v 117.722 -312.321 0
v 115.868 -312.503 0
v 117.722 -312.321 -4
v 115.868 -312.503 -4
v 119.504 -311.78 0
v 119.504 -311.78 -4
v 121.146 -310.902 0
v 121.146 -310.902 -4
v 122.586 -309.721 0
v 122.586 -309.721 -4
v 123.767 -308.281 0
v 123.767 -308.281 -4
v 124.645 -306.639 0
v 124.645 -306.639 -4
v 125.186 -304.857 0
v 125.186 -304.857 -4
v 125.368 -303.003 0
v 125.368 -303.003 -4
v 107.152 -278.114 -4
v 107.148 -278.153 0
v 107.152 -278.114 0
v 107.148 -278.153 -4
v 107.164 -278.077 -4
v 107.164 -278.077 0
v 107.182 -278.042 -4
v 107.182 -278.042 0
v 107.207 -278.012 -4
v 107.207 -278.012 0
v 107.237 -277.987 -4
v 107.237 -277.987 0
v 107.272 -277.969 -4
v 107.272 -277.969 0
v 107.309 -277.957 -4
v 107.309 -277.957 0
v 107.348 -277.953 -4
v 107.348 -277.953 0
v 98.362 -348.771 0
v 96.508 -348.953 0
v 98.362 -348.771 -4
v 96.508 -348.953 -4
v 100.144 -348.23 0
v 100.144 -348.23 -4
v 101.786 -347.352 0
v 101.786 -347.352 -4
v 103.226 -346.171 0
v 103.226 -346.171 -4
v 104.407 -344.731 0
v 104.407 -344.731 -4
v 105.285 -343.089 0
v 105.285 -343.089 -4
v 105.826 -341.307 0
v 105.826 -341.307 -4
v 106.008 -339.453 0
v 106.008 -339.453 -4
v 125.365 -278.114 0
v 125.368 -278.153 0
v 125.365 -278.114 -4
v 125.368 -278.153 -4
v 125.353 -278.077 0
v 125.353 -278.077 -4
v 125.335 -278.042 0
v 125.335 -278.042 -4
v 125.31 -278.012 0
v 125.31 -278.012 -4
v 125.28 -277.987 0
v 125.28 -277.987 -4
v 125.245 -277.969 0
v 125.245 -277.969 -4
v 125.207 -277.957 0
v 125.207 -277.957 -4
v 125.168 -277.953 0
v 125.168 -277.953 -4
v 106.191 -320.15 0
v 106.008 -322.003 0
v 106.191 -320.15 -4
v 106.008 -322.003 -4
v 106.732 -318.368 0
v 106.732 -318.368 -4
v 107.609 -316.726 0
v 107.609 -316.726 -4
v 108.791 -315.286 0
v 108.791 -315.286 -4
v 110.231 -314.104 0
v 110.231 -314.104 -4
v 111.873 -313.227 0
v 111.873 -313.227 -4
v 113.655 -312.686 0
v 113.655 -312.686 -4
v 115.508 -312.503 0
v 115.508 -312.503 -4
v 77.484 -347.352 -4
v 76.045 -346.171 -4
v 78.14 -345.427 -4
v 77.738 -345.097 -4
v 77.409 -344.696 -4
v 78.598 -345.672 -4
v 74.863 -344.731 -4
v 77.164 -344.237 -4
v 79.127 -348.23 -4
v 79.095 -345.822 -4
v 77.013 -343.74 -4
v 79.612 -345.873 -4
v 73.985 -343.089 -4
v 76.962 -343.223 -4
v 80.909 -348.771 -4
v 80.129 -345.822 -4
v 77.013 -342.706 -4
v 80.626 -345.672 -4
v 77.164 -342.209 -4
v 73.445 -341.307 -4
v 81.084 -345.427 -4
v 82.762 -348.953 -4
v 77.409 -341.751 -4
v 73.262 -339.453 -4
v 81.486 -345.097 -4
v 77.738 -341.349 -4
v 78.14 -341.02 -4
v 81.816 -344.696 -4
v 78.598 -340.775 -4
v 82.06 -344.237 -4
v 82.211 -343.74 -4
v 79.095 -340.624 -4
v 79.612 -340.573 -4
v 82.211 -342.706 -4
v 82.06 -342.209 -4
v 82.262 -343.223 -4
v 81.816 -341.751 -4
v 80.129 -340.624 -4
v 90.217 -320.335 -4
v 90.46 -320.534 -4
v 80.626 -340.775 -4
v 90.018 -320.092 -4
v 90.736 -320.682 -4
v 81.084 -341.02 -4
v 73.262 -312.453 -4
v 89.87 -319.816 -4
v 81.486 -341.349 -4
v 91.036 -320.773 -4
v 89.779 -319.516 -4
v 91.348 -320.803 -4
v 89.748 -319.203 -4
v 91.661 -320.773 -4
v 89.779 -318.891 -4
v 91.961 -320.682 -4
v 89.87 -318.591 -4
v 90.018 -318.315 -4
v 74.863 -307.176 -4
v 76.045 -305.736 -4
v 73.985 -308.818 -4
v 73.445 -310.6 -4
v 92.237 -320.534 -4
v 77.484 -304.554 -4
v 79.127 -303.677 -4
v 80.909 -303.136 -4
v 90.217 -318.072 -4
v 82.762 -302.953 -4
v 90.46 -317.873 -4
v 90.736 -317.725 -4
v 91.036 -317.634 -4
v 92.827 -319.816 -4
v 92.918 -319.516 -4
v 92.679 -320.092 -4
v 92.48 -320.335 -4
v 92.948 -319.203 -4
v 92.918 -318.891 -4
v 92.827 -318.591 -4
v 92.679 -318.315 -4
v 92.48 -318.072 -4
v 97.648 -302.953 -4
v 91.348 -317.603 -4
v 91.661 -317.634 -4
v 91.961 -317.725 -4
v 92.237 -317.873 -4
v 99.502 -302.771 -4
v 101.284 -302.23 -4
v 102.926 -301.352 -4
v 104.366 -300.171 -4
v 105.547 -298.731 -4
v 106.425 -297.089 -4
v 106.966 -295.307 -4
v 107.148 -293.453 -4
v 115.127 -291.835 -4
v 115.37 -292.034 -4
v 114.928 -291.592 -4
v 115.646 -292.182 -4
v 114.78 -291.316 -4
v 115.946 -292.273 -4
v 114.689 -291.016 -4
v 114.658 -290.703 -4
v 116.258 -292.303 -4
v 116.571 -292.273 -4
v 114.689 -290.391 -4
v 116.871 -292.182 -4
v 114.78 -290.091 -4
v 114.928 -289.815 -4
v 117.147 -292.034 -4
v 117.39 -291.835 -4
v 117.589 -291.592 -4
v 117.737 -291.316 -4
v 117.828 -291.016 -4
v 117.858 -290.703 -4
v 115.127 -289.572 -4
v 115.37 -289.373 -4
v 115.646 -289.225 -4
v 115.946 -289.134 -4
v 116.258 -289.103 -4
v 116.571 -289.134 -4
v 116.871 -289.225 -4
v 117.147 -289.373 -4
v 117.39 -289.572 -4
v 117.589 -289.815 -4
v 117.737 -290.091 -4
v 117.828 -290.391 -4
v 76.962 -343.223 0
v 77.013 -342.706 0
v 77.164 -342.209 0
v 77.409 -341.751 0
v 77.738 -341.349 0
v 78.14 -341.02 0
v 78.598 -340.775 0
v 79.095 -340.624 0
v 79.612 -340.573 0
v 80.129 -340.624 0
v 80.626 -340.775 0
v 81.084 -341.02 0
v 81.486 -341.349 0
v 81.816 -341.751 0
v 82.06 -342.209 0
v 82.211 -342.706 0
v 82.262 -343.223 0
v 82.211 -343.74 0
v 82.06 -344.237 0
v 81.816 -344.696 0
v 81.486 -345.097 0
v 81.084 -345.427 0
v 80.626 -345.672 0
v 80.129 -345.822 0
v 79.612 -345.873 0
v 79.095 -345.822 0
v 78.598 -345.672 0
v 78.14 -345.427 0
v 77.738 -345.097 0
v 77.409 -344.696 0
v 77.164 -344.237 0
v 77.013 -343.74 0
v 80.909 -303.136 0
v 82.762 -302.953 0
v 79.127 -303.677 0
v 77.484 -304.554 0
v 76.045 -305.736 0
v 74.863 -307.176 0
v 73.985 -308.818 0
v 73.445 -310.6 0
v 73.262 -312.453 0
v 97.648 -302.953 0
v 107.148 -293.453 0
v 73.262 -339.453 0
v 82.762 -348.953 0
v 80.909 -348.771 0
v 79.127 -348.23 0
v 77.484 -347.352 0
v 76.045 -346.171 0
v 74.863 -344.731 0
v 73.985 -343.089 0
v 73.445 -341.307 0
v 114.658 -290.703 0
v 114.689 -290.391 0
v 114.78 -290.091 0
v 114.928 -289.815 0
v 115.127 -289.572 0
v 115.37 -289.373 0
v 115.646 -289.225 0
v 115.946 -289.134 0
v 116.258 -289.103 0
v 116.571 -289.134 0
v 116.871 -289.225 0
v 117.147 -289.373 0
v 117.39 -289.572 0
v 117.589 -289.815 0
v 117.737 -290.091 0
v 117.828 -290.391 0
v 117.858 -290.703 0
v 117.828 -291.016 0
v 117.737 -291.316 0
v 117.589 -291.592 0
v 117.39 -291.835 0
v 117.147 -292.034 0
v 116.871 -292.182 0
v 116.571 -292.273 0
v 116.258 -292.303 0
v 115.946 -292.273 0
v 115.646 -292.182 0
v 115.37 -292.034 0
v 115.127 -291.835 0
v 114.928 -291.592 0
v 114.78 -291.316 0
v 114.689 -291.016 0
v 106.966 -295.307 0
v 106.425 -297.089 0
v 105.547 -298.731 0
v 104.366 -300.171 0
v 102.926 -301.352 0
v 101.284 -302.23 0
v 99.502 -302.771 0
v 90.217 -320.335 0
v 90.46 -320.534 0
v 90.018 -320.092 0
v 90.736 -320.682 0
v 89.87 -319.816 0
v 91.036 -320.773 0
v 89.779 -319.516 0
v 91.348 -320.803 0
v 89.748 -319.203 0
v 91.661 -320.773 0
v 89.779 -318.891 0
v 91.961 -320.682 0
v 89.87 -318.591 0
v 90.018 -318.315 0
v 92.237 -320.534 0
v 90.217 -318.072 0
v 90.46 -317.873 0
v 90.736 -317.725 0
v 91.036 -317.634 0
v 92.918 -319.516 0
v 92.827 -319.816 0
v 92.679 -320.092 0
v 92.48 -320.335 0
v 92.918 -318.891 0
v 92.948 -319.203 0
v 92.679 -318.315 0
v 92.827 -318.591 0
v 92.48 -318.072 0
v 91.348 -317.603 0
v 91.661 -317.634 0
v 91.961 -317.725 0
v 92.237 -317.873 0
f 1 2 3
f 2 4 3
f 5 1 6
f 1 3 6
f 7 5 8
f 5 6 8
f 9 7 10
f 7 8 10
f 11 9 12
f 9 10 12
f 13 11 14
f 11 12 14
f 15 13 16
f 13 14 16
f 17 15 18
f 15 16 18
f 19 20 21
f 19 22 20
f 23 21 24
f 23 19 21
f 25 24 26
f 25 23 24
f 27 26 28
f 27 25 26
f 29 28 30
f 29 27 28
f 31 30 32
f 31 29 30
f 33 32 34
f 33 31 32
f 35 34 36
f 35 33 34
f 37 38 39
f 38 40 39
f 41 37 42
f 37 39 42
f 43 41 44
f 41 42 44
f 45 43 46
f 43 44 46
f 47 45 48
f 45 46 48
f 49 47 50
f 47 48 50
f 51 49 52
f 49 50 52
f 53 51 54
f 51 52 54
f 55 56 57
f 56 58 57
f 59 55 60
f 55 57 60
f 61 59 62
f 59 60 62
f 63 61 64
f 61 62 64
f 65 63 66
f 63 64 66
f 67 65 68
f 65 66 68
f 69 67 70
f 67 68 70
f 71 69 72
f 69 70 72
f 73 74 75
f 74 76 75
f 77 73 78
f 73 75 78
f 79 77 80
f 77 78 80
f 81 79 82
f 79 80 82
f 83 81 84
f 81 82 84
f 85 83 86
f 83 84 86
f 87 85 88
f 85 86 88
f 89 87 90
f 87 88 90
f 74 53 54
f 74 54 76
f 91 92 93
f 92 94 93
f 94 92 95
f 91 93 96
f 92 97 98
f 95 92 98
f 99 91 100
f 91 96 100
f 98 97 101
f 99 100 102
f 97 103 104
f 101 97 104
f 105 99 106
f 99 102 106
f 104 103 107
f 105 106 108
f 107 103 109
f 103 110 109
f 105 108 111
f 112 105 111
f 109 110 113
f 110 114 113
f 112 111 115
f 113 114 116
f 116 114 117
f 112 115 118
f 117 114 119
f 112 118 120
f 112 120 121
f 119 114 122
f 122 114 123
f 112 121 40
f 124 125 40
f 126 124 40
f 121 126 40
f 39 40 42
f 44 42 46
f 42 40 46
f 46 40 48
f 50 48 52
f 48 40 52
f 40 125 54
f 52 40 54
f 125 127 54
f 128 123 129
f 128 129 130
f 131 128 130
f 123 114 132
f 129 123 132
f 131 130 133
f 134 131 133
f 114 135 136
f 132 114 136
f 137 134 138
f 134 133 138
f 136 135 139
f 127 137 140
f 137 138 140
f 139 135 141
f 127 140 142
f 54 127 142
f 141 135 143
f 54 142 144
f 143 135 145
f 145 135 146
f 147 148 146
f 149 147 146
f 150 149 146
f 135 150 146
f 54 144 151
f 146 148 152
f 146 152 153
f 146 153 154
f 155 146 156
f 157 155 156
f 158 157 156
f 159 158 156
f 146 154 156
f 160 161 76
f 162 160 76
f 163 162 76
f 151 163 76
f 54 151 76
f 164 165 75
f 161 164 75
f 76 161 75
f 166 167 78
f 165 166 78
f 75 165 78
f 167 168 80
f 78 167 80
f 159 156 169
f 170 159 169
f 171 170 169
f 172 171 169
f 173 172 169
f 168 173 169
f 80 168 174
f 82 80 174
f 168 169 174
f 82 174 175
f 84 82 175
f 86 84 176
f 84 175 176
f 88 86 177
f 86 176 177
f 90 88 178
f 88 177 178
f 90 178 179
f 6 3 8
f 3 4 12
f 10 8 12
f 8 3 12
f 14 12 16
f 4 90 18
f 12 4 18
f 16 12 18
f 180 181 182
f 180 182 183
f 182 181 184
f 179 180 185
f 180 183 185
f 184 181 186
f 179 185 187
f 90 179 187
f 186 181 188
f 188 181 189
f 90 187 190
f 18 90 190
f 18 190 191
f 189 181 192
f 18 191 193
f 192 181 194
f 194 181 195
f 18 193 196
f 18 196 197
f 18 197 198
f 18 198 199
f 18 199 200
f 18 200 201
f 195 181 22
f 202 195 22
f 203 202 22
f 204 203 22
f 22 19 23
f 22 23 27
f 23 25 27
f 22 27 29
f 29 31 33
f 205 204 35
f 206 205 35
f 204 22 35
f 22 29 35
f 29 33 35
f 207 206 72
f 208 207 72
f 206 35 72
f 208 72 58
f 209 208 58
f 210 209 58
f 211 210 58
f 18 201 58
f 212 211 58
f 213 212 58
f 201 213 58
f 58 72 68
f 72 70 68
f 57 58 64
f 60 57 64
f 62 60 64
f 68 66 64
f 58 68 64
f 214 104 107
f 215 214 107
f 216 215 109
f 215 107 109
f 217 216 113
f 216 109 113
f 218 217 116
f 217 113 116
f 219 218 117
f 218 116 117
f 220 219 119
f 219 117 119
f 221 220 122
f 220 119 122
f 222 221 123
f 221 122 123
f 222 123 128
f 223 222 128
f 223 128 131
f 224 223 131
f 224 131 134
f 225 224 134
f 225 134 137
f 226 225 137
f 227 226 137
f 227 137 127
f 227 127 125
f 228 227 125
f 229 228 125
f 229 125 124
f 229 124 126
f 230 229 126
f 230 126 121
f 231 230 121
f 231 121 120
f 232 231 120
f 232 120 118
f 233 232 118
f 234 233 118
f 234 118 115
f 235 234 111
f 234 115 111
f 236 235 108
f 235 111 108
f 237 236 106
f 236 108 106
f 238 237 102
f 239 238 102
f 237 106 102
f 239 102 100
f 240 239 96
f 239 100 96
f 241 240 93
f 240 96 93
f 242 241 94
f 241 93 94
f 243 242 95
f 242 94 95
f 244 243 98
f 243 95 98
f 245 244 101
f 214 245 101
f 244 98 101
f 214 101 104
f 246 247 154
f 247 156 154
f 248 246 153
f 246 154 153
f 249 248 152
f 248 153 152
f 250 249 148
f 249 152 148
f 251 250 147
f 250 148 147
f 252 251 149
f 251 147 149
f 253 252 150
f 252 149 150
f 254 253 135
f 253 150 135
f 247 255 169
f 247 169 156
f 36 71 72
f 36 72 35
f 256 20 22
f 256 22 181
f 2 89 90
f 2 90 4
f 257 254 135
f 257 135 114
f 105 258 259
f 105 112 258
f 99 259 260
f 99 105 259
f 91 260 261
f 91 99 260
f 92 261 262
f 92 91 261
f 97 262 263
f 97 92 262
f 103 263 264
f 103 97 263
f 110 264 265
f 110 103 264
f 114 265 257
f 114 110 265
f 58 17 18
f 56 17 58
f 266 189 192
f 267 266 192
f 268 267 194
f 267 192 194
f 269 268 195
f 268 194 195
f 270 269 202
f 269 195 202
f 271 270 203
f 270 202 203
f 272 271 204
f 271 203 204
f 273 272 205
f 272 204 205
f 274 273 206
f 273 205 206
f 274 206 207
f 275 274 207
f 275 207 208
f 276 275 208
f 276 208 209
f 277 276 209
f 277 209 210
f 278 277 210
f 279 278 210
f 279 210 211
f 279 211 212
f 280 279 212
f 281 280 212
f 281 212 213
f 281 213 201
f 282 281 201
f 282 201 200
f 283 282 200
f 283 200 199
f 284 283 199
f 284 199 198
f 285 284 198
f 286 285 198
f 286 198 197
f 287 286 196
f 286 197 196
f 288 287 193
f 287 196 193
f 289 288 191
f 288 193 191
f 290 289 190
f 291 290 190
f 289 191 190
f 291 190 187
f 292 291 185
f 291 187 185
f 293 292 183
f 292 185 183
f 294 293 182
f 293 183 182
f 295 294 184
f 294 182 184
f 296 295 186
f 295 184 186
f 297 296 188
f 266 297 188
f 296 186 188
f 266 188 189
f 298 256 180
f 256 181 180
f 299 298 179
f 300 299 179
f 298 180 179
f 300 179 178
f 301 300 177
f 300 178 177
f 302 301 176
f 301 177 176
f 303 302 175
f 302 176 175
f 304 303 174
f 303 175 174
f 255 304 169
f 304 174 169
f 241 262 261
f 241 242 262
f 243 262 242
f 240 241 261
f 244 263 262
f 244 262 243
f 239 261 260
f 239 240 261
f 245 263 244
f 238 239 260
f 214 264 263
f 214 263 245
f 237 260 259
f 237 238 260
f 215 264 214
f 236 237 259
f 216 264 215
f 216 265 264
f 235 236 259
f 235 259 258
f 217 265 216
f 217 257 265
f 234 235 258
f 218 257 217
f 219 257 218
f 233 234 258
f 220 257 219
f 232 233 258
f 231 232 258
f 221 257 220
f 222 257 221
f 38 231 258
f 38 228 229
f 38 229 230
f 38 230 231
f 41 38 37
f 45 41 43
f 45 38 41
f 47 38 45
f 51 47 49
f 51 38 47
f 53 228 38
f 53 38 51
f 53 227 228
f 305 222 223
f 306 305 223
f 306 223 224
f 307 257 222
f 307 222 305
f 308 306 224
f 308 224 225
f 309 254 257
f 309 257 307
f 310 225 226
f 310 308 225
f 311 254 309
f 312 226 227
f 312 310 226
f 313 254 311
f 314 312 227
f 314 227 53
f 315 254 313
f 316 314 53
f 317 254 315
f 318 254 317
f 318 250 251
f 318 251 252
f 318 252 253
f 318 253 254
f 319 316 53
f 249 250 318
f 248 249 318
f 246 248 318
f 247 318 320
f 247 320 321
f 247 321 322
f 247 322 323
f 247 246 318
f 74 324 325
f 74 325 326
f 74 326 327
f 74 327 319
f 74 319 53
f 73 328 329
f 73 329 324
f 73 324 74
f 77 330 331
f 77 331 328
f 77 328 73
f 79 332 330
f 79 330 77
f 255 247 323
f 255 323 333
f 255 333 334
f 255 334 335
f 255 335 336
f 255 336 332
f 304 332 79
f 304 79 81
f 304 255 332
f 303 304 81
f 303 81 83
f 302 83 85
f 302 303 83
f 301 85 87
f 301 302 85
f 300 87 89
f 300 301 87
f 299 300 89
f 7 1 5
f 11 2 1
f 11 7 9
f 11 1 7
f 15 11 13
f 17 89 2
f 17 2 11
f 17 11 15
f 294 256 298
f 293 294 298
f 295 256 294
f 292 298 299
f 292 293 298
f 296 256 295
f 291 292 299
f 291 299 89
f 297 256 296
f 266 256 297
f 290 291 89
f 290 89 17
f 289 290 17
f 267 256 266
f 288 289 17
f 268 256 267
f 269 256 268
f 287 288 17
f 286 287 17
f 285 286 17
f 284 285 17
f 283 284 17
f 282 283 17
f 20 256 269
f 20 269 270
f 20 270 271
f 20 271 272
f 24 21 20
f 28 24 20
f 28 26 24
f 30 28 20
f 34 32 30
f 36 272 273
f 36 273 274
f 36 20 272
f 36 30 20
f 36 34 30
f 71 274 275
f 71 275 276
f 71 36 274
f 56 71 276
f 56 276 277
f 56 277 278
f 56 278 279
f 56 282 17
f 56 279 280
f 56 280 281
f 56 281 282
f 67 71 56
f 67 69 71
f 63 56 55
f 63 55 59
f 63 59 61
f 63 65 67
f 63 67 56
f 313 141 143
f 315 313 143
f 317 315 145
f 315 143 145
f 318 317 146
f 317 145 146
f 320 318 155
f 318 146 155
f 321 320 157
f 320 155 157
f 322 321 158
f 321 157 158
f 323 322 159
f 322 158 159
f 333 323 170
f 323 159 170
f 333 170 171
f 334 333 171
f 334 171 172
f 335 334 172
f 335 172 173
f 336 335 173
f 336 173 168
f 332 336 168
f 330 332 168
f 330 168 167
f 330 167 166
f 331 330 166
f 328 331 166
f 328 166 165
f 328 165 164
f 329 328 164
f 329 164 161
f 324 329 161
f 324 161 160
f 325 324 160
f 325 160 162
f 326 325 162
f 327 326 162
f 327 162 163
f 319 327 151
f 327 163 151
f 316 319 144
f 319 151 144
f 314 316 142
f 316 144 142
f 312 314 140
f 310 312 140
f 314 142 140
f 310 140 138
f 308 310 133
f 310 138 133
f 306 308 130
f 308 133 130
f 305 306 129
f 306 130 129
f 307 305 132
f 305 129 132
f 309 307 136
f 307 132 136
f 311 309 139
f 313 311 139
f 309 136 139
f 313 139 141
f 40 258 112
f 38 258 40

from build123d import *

# Parameters (mm, degrees)
BOSS_EXTRUDE1_DEPTH  = 4
FILLET1_R            = 9.5
M3_CLEARANCE_HOLE1_D = 3.2
M5_CLEARANCE_HOLE1_D = 5.3
FILLET2_R            = 0.2


with BuildPart() as part:
    # Sketch1 → Boss-Extrude1 (new body)
    with BuildSketch(Plane.XY):
        Polygon((73.262039089, -348.953453607), (106.008421642, -348.953453607), (106.008421642, -312.503453607), (125.368421642, -312.503453607), (125.368421642, -277.953453607), (107.148421642, -277.953453607), (107.148421642, -302.953453607), (73.262039089, -302.953453607), align=None)
    extrude(amount=-BOSS_EXTRUDE1_DEPTH)

    # Fillet1
    fillet1_edges = [part.edges().sort_by_distance(p)[0] for p in [
        (73.262039089, -302.953453607, -2),
        (107.148421642, -302.953453607, -2),
        (125.368421642, -312.503453607, -2),
        (106.008421642, -312.503453607, -2),
        (106.008421642, -348.953453607, -2),
        (73.262039089, -348.953453607, -2),
    ]]
    fillet(fillet1_edges, radius=FILLET1_R)

    # M3 Clearance Hole1 (through all)
    with Locations(Plane.XY):
        with Locations((116.258421642, -290.703453607), (91.348421642, -319.203453607)):
            Hole(M3_CLEARANCE_HOLE1_D / 2)

    # M5 Clearance Hole1 (through all)
    with Locations(Plane.XY):
        with Locations((79.612142542, -343.223274497)):
            Hole(M5_CLEARANCE_HOLE1_D / 2)

    # Fillet2
    fillet2_edges = [part.edges().sort_by_distance(p)[0] for p in [
        (107.148421642, -277.953453607, -2),
        (125.368421642, -277.953453607, -2),
    ]]
    fillet(fillet2_edges, radius=FILLET2_R)


solid = part.part
